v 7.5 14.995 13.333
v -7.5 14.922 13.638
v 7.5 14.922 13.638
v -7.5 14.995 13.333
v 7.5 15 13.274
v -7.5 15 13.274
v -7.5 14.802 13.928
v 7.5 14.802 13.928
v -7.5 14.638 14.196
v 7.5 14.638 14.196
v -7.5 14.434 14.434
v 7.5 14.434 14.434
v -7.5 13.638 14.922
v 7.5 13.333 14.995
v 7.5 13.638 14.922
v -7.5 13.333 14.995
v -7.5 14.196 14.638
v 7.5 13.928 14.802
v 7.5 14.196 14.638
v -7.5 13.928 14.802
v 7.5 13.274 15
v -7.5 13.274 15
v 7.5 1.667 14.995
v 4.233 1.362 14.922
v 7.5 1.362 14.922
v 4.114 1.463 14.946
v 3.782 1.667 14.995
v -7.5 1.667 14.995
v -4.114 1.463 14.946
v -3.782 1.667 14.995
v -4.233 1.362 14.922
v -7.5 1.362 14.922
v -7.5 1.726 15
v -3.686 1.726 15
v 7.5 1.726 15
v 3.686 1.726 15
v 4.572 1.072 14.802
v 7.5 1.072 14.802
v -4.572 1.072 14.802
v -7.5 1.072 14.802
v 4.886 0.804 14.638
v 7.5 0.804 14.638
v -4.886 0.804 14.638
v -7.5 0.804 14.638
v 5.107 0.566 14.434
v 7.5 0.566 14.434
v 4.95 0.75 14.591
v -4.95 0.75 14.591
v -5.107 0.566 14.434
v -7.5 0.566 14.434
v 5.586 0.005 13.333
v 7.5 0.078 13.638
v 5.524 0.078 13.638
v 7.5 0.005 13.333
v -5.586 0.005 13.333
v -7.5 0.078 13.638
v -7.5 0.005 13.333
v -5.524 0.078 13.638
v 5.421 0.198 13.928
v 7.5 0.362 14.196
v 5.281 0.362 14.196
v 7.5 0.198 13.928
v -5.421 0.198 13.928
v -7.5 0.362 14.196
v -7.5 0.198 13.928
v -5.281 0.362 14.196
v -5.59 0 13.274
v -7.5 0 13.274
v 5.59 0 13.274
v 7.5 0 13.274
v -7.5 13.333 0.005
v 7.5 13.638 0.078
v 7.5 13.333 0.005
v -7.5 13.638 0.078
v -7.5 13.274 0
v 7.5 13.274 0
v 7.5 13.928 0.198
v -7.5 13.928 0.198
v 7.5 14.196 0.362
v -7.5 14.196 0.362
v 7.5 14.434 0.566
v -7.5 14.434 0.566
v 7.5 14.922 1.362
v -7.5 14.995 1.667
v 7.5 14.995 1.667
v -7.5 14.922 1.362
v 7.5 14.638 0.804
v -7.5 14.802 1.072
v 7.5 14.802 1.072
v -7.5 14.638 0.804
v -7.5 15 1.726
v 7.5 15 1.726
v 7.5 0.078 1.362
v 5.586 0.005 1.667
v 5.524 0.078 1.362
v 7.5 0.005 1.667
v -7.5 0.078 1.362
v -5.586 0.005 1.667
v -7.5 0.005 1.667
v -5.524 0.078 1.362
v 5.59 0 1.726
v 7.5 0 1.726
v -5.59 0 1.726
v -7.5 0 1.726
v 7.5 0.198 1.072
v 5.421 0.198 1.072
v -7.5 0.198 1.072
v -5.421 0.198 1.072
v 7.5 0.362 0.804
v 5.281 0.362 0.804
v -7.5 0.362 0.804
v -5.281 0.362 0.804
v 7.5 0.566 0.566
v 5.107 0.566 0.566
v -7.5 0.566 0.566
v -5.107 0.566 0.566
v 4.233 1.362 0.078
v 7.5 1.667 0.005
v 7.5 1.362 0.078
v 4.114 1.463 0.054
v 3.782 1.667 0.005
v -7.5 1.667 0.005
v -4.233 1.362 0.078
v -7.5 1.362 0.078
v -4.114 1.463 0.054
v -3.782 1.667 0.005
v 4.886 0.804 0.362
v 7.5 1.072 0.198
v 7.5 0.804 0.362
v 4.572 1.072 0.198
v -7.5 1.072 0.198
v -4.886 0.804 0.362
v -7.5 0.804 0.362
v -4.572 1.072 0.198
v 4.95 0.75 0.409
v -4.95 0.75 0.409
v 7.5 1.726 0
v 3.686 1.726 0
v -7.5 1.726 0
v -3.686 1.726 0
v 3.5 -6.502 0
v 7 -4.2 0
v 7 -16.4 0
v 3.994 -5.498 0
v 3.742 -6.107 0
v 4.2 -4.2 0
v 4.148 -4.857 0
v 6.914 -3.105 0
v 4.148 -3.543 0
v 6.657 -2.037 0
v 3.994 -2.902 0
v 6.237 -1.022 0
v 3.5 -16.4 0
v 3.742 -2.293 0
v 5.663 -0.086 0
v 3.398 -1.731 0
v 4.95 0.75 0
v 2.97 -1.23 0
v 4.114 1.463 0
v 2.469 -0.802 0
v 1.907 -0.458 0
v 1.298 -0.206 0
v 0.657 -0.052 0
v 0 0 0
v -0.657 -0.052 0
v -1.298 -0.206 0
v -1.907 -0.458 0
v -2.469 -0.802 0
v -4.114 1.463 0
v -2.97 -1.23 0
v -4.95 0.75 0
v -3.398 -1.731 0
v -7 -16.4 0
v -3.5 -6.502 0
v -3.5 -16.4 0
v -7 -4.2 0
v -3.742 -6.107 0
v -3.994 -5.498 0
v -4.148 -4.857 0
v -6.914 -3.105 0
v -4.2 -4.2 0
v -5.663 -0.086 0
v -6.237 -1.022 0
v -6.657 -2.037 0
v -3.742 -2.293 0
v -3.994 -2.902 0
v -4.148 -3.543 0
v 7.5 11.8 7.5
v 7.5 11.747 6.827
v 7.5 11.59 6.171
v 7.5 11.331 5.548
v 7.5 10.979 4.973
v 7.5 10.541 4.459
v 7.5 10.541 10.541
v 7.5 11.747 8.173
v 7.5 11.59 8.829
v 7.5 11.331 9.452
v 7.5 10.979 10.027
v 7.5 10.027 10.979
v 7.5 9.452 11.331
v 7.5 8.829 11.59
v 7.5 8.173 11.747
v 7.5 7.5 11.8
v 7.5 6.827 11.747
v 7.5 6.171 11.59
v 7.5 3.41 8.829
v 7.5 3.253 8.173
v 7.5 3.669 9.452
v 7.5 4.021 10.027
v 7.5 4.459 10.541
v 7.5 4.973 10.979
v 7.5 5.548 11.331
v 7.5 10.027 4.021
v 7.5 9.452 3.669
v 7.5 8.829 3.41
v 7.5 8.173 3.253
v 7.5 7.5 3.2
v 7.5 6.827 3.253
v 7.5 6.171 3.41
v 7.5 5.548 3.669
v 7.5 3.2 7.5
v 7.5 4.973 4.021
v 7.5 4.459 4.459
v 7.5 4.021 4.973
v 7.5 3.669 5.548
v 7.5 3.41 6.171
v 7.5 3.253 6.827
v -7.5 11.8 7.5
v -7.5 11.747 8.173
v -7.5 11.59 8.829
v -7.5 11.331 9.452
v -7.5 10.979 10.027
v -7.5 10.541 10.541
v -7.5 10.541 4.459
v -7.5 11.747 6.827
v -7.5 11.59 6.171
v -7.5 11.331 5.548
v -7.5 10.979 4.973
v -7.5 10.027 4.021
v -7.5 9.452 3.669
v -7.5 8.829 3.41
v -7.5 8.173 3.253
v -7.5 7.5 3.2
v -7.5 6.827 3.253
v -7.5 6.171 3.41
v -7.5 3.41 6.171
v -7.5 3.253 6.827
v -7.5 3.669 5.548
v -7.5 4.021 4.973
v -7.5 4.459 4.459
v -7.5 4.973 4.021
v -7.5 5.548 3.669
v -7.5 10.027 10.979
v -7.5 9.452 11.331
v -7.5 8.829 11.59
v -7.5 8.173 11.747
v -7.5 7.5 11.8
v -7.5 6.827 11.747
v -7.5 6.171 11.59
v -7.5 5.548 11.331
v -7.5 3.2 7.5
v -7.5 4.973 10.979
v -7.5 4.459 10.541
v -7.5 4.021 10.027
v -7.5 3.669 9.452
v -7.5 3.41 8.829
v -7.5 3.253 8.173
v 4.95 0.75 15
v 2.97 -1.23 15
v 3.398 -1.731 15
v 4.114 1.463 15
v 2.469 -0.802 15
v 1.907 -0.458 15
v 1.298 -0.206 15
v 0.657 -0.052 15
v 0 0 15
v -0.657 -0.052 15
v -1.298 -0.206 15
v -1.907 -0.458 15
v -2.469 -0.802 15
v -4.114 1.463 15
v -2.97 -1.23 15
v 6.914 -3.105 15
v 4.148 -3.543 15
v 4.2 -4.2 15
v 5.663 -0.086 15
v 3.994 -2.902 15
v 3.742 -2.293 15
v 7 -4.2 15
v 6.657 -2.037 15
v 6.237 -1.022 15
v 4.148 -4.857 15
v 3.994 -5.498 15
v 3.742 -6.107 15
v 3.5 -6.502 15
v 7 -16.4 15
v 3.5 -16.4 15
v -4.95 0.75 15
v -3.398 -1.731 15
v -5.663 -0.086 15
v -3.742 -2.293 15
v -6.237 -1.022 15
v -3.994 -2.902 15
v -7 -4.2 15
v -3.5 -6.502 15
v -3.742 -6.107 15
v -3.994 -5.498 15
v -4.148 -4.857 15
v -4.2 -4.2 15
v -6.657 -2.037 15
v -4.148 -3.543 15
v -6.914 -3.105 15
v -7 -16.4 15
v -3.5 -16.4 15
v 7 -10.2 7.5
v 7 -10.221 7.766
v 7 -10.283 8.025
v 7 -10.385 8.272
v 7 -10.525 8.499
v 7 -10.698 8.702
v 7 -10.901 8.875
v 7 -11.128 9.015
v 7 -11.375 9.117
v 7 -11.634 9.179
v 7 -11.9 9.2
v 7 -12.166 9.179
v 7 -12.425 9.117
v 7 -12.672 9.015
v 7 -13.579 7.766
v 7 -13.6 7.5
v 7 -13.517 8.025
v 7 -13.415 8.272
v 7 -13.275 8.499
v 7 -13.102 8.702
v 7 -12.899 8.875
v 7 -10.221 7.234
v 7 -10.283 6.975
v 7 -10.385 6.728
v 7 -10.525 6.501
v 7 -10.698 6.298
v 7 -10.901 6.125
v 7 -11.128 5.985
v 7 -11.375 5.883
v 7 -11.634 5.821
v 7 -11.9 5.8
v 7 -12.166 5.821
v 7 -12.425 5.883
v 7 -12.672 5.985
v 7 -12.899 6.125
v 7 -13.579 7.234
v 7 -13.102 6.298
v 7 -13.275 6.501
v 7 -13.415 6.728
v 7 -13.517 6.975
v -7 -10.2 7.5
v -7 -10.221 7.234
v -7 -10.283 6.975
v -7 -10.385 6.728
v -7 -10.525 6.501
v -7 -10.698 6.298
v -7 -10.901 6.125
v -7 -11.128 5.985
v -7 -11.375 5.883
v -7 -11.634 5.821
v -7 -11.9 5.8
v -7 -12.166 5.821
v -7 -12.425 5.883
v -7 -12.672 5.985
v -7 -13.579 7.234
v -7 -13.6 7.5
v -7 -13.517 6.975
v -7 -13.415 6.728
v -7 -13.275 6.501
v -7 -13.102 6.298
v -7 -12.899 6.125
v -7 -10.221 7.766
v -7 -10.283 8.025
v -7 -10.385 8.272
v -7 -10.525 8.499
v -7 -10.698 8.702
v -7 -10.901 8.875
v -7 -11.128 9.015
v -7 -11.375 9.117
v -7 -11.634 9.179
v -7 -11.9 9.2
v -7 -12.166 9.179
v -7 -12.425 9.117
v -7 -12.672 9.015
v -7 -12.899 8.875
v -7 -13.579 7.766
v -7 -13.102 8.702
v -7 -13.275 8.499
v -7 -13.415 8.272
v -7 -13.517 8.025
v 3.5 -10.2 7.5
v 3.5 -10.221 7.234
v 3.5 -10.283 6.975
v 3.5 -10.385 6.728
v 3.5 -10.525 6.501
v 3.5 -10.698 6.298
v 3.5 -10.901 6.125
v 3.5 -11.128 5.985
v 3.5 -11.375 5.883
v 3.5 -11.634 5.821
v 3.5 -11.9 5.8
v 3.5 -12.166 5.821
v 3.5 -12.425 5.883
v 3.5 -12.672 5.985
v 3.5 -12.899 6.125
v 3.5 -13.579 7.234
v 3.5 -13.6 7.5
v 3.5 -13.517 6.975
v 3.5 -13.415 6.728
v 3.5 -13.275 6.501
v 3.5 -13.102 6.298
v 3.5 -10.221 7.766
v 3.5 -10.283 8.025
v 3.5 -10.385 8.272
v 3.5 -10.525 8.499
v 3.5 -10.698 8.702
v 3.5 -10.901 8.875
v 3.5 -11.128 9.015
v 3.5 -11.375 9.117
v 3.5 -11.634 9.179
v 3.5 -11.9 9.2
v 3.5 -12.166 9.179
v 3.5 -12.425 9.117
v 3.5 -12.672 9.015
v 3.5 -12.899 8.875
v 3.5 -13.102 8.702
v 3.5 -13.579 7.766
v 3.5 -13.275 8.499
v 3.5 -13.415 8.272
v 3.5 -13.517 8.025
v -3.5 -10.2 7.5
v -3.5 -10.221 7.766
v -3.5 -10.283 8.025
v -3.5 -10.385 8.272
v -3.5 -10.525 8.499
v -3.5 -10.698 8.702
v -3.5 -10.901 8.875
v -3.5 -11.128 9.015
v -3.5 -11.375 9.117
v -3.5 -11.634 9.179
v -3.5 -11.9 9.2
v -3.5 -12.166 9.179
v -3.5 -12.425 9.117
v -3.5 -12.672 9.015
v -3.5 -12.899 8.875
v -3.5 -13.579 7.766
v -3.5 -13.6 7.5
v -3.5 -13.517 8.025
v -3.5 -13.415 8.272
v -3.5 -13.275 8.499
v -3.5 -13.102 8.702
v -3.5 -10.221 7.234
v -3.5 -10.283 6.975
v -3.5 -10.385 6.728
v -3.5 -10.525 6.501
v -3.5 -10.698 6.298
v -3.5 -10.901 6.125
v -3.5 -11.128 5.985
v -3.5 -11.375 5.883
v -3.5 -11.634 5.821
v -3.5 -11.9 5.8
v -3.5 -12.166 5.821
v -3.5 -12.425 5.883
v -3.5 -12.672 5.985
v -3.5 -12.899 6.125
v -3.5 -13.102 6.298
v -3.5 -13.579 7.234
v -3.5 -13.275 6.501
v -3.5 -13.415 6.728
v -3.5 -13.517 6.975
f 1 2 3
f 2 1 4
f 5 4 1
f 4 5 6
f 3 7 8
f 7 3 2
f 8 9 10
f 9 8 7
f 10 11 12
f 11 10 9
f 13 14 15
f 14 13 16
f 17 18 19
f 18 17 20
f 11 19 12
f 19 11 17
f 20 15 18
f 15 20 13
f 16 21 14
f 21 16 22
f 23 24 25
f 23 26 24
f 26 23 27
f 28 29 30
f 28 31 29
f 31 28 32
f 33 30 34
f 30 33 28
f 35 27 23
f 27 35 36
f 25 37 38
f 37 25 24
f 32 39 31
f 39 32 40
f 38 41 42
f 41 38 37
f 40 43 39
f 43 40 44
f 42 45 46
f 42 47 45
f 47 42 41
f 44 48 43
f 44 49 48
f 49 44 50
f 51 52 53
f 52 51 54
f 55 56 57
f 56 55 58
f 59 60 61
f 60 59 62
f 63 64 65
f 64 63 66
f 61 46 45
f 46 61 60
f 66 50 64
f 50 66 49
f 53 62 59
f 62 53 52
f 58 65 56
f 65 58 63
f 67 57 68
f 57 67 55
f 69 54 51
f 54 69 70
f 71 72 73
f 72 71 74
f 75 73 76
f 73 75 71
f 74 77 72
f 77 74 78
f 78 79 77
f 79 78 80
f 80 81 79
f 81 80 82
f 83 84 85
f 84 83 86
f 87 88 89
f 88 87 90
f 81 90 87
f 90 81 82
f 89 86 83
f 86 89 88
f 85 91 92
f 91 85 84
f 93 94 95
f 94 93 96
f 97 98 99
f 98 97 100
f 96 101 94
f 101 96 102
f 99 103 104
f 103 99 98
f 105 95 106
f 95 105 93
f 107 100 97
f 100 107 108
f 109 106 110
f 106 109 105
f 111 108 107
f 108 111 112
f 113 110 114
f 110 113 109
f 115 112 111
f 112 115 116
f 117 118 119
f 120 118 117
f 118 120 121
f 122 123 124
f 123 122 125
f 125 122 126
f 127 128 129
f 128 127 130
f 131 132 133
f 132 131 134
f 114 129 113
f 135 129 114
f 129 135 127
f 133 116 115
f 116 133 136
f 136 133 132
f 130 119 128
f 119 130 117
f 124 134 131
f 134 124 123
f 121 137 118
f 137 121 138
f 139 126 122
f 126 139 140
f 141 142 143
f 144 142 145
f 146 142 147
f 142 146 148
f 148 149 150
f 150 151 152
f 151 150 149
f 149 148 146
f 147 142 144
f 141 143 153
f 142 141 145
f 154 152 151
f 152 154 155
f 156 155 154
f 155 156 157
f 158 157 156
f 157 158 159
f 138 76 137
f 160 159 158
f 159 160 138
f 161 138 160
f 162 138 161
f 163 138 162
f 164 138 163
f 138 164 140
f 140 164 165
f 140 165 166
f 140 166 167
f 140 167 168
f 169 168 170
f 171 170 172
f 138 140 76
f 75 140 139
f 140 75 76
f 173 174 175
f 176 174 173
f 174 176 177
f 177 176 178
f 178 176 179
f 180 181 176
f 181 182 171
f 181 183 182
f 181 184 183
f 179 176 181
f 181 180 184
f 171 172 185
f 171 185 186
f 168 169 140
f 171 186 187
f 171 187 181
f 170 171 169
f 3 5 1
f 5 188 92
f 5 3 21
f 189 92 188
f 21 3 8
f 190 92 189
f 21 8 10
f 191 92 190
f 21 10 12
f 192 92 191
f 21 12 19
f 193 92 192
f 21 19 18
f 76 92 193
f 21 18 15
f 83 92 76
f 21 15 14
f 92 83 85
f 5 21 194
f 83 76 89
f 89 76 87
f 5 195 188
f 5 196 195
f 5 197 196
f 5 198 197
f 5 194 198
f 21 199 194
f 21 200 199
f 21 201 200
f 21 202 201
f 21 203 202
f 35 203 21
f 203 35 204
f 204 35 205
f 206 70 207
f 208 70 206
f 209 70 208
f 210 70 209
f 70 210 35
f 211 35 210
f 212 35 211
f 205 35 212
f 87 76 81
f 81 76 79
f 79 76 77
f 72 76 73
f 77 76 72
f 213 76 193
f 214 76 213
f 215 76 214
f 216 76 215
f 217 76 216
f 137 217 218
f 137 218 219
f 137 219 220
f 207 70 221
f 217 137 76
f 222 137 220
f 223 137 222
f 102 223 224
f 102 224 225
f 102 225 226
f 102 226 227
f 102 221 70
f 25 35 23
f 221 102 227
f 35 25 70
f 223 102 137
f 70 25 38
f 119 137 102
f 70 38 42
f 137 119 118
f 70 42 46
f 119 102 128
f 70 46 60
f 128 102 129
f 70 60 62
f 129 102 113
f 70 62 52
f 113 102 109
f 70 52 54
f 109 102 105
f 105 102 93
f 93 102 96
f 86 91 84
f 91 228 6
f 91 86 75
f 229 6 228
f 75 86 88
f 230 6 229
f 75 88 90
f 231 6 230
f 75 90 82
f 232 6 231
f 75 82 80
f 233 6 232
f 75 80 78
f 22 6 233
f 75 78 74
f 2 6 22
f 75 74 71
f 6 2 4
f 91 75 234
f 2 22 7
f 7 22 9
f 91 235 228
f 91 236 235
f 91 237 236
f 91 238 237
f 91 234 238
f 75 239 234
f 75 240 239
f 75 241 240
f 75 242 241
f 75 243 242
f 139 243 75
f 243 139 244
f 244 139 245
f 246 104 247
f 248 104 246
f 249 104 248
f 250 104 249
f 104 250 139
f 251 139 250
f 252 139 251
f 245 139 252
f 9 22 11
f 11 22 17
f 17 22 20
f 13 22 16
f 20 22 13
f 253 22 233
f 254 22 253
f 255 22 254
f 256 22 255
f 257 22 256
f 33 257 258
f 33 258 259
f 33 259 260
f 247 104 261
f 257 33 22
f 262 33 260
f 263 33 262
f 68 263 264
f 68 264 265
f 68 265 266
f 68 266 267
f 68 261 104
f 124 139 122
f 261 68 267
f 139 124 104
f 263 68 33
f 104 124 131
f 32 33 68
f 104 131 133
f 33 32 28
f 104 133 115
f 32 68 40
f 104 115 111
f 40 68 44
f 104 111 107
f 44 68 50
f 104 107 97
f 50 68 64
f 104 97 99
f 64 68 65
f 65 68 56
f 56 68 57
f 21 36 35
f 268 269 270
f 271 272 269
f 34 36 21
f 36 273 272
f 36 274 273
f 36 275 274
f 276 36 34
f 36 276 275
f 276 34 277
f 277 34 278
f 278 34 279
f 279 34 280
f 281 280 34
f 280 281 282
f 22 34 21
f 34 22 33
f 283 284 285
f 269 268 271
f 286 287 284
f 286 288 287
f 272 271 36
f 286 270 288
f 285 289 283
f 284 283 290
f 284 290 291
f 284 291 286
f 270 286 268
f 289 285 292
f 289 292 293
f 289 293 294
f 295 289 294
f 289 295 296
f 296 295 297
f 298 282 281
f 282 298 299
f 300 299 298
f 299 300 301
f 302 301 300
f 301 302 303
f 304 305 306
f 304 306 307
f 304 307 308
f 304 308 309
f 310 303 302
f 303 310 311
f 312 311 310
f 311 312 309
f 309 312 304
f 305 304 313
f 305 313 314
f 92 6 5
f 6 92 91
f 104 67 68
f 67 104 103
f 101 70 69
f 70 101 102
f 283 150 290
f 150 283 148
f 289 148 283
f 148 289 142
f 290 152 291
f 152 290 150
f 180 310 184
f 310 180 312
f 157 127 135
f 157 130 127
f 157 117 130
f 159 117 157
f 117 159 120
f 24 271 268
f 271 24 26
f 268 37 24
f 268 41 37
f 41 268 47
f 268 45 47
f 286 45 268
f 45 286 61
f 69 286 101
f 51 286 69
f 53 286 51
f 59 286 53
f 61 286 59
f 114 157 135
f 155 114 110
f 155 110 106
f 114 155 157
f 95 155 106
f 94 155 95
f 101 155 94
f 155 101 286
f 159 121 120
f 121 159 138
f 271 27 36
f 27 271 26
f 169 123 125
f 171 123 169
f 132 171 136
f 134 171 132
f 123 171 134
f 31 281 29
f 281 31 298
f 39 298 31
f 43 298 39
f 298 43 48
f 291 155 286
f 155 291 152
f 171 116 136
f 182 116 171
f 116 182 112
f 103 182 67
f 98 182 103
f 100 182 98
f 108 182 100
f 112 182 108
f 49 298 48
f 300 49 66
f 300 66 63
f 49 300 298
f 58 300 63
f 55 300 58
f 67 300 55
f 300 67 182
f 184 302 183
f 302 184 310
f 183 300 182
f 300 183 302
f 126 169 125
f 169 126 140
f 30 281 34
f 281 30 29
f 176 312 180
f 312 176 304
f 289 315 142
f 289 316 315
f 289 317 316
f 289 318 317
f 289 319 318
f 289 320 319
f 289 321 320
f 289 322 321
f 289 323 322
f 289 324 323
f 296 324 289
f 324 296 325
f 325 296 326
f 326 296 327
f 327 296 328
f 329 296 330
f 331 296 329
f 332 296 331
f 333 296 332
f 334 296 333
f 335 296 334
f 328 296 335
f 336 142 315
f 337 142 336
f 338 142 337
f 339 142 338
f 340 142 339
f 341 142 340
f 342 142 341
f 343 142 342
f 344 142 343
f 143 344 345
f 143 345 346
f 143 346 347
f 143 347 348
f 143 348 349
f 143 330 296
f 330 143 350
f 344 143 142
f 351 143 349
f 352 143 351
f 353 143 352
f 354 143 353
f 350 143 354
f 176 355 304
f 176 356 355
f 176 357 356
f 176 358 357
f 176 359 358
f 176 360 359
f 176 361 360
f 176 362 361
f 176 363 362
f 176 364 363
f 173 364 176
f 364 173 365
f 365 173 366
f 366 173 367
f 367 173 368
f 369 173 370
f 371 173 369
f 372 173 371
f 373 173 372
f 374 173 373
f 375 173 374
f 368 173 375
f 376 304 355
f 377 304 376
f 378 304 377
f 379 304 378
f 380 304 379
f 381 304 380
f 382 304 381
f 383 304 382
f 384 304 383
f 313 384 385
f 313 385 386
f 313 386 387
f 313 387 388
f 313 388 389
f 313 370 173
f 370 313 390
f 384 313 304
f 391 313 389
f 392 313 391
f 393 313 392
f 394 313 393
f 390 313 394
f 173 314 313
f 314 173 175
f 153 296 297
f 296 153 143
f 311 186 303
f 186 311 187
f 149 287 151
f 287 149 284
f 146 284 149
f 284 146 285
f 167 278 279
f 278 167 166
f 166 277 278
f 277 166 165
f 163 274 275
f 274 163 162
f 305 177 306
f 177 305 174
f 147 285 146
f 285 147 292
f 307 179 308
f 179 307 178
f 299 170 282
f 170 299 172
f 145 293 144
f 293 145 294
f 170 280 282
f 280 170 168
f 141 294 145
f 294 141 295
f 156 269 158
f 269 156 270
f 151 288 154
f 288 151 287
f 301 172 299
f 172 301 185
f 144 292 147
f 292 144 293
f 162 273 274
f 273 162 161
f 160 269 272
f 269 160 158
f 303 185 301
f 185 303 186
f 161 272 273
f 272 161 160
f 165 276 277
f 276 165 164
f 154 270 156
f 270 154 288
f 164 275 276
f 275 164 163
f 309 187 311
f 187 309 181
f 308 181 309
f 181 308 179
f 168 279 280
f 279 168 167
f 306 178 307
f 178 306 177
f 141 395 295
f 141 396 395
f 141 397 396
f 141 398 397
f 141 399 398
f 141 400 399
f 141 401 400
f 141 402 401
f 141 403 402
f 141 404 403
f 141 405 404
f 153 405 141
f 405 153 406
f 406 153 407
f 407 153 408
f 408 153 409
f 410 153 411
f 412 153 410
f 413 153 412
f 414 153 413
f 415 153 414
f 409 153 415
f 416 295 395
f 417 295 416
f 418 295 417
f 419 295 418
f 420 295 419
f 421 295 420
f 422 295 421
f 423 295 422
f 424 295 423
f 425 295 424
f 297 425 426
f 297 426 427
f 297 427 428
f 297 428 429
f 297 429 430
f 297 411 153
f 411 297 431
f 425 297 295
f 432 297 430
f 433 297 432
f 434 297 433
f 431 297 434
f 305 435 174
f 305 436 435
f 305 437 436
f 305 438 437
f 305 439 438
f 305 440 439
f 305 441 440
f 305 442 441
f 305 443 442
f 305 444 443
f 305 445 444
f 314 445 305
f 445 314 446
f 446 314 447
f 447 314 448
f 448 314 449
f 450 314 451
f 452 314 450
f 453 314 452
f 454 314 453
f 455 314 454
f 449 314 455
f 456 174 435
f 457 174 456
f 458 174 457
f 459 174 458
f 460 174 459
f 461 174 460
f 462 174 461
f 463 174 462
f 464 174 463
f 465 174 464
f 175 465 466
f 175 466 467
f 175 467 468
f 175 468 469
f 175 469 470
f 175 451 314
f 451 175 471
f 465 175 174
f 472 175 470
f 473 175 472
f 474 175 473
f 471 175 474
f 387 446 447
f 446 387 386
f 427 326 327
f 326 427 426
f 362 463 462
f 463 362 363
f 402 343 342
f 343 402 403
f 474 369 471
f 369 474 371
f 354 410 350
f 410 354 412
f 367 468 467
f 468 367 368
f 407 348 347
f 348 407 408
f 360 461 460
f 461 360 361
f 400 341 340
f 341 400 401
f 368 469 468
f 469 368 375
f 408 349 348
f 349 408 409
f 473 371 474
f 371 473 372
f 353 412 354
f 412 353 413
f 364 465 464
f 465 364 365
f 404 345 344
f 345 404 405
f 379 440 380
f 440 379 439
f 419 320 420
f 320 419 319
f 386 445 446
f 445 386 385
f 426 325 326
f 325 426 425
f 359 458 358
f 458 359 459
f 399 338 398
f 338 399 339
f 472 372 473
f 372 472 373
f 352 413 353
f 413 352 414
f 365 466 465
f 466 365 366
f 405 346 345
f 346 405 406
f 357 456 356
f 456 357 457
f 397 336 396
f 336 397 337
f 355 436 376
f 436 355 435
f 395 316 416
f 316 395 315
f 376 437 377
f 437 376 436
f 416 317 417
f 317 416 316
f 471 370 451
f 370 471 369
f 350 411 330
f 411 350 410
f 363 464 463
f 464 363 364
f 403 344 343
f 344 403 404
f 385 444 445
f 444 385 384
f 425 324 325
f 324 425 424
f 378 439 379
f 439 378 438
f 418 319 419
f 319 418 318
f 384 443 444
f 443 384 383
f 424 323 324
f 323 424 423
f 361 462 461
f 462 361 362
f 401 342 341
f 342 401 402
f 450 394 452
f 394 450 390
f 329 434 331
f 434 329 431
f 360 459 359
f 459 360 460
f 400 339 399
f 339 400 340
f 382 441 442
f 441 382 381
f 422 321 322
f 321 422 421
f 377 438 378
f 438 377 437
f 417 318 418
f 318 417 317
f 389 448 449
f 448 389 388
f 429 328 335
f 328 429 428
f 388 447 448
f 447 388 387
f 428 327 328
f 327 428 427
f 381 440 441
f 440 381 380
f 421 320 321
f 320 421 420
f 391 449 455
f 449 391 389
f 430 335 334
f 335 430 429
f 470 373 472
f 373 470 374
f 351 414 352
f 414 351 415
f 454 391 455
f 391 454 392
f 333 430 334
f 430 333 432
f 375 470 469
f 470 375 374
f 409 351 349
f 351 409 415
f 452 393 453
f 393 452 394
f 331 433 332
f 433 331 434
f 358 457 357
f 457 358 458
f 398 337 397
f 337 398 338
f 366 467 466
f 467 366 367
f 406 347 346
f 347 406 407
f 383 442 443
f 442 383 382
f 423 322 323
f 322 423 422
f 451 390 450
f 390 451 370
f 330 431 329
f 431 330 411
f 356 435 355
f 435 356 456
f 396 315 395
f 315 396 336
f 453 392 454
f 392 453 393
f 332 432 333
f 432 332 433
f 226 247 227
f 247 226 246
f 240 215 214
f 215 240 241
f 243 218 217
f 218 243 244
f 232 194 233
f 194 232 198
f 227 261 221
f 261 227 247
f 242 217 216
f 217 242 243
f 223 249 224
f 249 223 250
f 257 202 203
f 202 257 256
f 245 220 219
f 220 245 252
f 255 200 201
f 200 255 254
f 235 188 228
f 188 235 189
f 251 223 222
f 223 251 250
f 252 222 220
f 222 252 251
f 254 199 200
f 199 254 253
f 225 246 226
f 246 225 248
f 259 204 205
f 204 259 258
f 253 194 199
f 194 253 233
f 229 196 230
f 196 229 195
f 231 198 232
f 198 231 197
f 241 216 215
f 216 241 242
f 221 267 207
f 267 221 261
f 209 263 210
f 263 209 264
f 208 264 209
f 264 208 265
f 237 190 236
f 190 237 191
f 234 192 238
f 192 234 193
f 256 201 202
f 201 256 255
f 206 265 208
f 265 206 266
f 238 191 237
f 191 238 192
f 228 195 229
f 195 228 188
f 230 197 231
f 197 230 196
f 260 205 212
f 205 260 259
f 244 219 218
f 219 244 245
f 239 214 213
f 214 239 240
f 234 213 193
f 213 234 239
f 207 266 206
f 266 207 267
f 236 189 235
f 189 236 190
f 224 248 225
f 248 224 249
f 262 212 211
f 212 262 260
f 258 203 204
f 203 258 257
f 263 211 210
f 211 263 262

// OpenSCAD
// file: library/component-data.scad
// ========================================================================================
// Robori Mendel
// Dimensions of standard components
// GNU GPL v3
//
// Contact : support@robori.com
// Reference : http://www.robori.com/documentation/Mendel
//
// History :
// 31 Jan 2015 - First version
// ========================================================================================

// Linear bearing LM8UU
LM8UU_L = 24;
LM8UU_OD = 15;
LM8UU_ID = 8;

// Pulley GT2
PULLEY_GT2_ID = 5;
PULLEY_GT2_OD = 18;
PULLEY_GT2_L = 18.5;
PULLEY_GT2_FLANGE_L = 1.5;
PULLEY_GT2_TEETH_L = 7.5;
PULLEY_GT2_TEETH_OD = 10;
PULLEY_GT2_HUB_L =  PULLEY_GT2_L - PULLEY_GT2_FLANGE_L - PULLEY_GT2_TEETH_L;		// = 9.5

// Nylock nut
NYLOCK_NUT_M5_H = 5;

// NEMA 17
NEMA17_L = 42;
NEMA17_SCREW_FROM_EDGE = (42 - 31)/2;
NEMA17_SCREW_SIZE = 3;

// Fan 40mm x 40mm
FAN40_L = 40;
FAN40_ID = 38;
FAN40_SCREW_D = 3.4;
FAN40_SCREW_FROM_EDGE = 4;

// Washer
WASHER_M3_ID = 3.2;
WASHER_M3_OD = 6;
WASHER_M3_H = 0.5;
// file: library/component.scad
// ========================================================================================
// Robori Mendel
// RP library
// GNU GPL v3
//
// Contact : support@robori.com
// Reference : http://www.robori.com/documentation/Mendel
//
// History :
// 31 Jan 2015 - First version
// ========================================================================================

include <component-data.scad>

component_fn = 25;

// Rod clamp
module clamp(in_dia, out_dia, leg_length, leg_space, height, screw_dia, screw_dist_from_end)
{
	difference()
	{
		union()
		{
			cylinder(h=height, r=out_dia/2, center=false, $fn=component_fn);
			translate([-out_dia/2, -in_dia/2 - leg_length, 0]) cube([out_dia, in_dia/2 + leg_length, height]);
		}
		// hole
		translate([0, 0, -1]) cylinder(h=height + 2, r=in_dia/2, center=false, $fn=component_fn);
		// leg space
		translate([-leg_space/2, -in_dia/2 - leg_length - 1, -1]) cube([leg_space, in_dia/2 + leg_length + 1, height + 2]);
		// screw hole
		translate([-out_dia/2 - 1, -in_dia/2 - leg_length + screw_dist_from_end, height/2]) rotate([0, 90, 0]) cylinder(h=out_dia + 2, r=screw_dia/2, center=false, $fn=component_fn);
	}
}

// LM8UU holder
lm8uu_holder_wall_t = 3;
lm8uu_holder_cone_l = 2;
lm8uu_holder_slot_w = 9;
lm8uu_holder_id = LM8UU_OD - 0.1;
lm8uu_holder_l = LM8UU_L + lm8uu_holder_cone_l;
lm8uu_holder_w = LM8UU_OD + 2*lm8uu_holder_wall_t;
lm8uu_holder_h = LM8UU_OD + 2*lm8uu_holder_cone_l;

module lm8uu_holder()
{
	cone_d1 = 0;
	cone_d2 = LM8UU_OD + 2*lm8uu_holder_cone_l;
	cone_h = cone_d2/2;

	difference()
	{
		// Block
		cube([lm8uu_holder_l, lm8uu_holder_w, lm8uu_holder_h]);
		// Cylinder
		translate([-1, lm8uu_holder_w/2, lm8uu_holder_cone_l + LM8UU_OD/2]) rotate([0, 90, 0]) cylinder(r=lm8uu_holder_id/2, h=lm8uu_holder_l + 2, center=false, $fn=component_fn);
		// Cone
		translate([lm8uu_holder_l - cone_h + 0.01, lm8uu_holder_w/2, lm8uu_holder_cone_l + LM8UU_OD/2]) rotate([0, 90, 0]) cylinder(r1=cone_d1/2, r2=cone_d2/2, h=cone_h, center=false, $fn=component_fn);
		// Slot
		translate([-1, lm8uu_holder_w/2 - lm8uu_holder_slot_w/2, lm8uu_holder_h - lm8uu_holder_cone_l*2 - 1]) cube([lm8uu_holder_l + 2, lm8uu_holder_slot_w, lm8uu_holder_cone_l*2 + 2]);
	}
}
// file: library/library_3d.scad
// ========================================================================================
// Robori Mendel
// General 3D library
// GNU GPL v3
//
// Contact : support@robori.com
// Reference : http://www.robori.com/documentation/Mendel
//
// History :
// 2013 - First version
// ========================================================================================

lib3d_fn = 50;

// TESTING
//lib3d_hex_nut_recess(3);
//lib3d_round_cube(10, 8, 10, 1, true, false, true, false);


// Hexagonal nut recess
module lib3d_hex_nut_recess(size)
{
	length = 0.8*size;
	hex_r = 1.8*size/2;
	cylinder(h=length, r=hex_r, center=false, $fn=6);
}

// Cube with customized rounded corners
module lib3d_round_cube(x, y, z, rad, left_top=true, left_bottom=true, right_top=true, right_bottom=true)
{
	rx = x/2 - rad + 0.02;
	ry = y/2 - rad + 0.02;

	translate([x/2, y/2, 0]) difference()
	{	
		translate([-x/2, -y/2, 0]) cube([x, y, z]);
		if (left_top)
			translate([-rx, ry, -1]) rotate([0, 0, 90]) __lib3d_round_corner(rad, z + 2);
		if (left_bottom)
			translate([-rx, -ry, -1]) rotate([0, 0, 180]) __lib3d_round_corner(rad, z + 2);
		if (right_top)
			translate([rx, ry, -1]) __lib3d_round_corner(rad, z + 2);
		if (right_bottom)
			translate([rx, -ry, -1]) rotate([0, 0, 270]) __lib3d_round_corner(rad, z + 2);
	}
}

// Helper
module __lib3d_round_corner(rad, height)
{
	difference()
	{
		cube([rad, rad, height]);
		cylinder(h=height, r=rad, center=false, $fn=lib3d_fn);
	}
}
// main file
// ========================================================================================
// Robori Mendel
// Filament holder clamp rear
// GNU GPL v3
//
// Contact : support@robori.com
// Reference : http://www.robori.com/documentation/Mendel
//
// History :
// 17 Jun 2015 - First version
// ========================================================================================

include <library/library_3d.scad>
include <library/component.scad>

$fn = 40;
lib3d_fn = 40;
component_fn = 40;

// rod holder
holder_l = 15;
holder_w = 15;
holder_h = 15;
holder_id = 8 + 0.6;
holder_r = 2;

// clamp
clamp_id = 8 + 0.4;
clamp_od = 8 + 2*3;
clamp_leg_length = 8;
clamp_leg_space = 7;
clamp_h = 15;
clamp_screw_d = 3 + 0.4;
clamp_screw_dist = 4.5;

filament_holder_clamp();

module filament_holder_clamp()
{
	difference()
	{
		union()
		{
			// rod holder block
			translate([-holder_l/2, 0, holder_h]) rotate([0, 90, 0]) lib3d_round_cube(holder_h, holder_w, holder_l, holder_r, true, true, true, true);
			// clamp
			translate([0, -clamp_id/2, 0]) clamp(clamp_id, clamp_od, clamp_leg_length, clamp_leg_space, clamp_h, clamp_screw_d, clamp_screw_dist);
		}
		// rod holder hole 
		translate([-holder_l/2 - 1, holder_w/2, holder_h/2]) rotate([0, 90, 0]) cylinder(r=holder_id/2, h=holder_l + 2, center=false);
	}
}
